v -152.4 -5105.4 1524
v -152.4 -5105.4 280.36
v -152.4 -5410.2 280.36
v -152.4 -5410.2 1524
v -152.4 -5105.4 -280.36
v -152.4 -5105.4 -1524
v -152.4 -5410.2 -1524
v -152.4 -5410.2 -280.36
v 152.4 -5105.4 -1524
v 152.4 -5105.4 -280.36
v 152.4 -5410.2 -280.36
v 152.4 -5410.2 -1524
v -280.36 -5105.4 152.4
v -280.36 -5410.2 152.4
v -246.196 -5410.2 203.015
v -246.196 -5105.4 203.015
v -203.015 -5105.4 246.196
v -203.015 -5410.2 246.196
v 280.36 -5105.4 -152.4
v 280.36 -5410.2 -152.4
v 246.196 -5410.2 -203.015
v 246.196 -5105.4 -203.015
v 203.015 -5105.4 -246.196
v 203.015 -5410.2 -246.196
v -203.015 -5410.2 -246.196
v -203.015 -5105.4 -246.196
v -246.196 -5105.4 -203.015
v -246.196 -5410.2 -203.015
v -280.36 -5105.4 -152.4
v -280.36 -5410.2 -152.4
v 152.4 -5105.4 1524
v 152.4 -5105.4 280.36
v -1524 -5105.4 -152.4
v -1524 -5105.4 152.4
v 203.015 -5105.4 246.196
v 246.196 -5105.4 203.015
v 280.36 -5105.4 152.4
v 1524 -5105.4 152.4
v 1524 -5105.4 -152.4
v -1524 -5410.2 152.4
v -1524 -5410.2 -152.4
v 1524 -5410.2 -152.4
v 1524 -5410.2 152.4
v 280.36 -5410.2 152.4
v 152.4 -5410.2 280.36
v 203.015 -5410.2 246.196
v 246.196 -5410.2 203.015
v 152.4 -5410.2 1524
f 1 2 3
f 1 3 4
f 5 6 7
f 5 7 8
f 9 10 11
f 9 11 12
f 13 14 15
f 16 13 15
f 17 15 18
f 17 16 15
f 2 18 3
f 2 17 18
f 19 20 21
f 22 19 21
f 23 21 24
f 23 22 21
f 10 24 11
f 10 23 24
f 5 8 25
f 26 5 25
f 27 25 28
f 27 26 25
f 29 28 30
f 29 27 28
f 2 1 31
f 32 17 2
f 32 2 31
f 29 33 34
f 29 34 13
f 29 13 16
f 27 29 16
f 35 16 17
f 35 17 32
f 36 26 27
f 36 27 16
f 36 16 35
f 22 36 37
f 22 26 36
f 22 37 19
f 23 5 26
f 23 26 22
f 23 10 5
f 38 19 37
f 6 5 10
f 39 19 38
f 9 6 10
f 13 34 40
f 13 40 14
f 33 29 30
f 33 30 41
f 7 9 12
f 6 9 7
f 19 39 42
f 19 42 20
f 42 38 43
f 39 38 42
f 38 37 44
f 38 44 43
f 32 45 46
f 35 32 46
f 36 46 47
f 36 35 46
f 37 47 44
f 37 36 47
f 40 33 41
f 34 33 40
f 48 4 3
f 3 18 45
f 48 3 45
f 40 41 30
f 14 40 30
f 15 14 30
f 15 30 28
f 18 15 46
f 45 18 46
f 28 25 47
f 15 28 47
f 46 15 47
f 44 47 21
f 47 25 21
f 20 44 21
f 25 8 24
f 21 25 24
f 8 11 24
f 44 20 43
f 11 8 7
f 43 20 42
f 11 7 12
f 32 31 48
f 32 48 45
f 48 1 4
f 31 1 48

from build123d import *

# Parameters (mm, degrees)
BOSS_EXTRUDE1_START = -5105.4
BOSS_EXTRUDE1_DEPTH = 304.8


with BuildPart() as part:
    # Sketch1 → Boss-Extrude1 (new body)
    with BuildSketch(Plane(origin=(0, 0, 0), x_dir=(1, 0, 0), z_dir=(0, 1, 0)).offset(BOSS_EXTRUDE1_START)):
        with BuildLine():
            Line((-152.4, -280.359807763), (-152.4, -1524))
            Line((-152.4, -1524), (152.4, -1524))
            Line((152.4, -1524), (152.4, -280.359807763))
            ThreePointArc((152.4, -280.359807763), (225.640623347, -225.640623347), (280.359807763, -152.4))
            Line((280.359807763, -152.4), (1524, -152.4))
            Line((1524, -152.4), (1524, 152.4))
            Line((1524, 152.4), (280.359807763, 152.4))
            ThreePointArc((280.359807763, 152.4), (225.640623347, 225.640623347), (152.4, 280.359807763))
            Line((152.4, 280.359807763), (152.4, 1524))
            Line((152.4, 1524), (-152.4, 1524))
            Line((-152.4, 1524), (-152.4, 280.359807763))
            ThreePointArc((-152.4, 280.359807763), (-225.640623347, 225.640623347), (-280.359807763, 152.4))
            Line((-280.359807763, 152.4), (-1524, 152.4))
            Line((-1524, 152.4), (-1524, -152.4))
            Line((-1524, -152.4), (-280.359807763, -152.4))
            ThreePointArc((-280.359807763, -152.4), (-225.640623347, -225.640623347), (-152.4, -280.359807763))
        make_face()
    extrude(amount=-BOSS_EXTRUDE1_DEPTH)


solid = part.part
